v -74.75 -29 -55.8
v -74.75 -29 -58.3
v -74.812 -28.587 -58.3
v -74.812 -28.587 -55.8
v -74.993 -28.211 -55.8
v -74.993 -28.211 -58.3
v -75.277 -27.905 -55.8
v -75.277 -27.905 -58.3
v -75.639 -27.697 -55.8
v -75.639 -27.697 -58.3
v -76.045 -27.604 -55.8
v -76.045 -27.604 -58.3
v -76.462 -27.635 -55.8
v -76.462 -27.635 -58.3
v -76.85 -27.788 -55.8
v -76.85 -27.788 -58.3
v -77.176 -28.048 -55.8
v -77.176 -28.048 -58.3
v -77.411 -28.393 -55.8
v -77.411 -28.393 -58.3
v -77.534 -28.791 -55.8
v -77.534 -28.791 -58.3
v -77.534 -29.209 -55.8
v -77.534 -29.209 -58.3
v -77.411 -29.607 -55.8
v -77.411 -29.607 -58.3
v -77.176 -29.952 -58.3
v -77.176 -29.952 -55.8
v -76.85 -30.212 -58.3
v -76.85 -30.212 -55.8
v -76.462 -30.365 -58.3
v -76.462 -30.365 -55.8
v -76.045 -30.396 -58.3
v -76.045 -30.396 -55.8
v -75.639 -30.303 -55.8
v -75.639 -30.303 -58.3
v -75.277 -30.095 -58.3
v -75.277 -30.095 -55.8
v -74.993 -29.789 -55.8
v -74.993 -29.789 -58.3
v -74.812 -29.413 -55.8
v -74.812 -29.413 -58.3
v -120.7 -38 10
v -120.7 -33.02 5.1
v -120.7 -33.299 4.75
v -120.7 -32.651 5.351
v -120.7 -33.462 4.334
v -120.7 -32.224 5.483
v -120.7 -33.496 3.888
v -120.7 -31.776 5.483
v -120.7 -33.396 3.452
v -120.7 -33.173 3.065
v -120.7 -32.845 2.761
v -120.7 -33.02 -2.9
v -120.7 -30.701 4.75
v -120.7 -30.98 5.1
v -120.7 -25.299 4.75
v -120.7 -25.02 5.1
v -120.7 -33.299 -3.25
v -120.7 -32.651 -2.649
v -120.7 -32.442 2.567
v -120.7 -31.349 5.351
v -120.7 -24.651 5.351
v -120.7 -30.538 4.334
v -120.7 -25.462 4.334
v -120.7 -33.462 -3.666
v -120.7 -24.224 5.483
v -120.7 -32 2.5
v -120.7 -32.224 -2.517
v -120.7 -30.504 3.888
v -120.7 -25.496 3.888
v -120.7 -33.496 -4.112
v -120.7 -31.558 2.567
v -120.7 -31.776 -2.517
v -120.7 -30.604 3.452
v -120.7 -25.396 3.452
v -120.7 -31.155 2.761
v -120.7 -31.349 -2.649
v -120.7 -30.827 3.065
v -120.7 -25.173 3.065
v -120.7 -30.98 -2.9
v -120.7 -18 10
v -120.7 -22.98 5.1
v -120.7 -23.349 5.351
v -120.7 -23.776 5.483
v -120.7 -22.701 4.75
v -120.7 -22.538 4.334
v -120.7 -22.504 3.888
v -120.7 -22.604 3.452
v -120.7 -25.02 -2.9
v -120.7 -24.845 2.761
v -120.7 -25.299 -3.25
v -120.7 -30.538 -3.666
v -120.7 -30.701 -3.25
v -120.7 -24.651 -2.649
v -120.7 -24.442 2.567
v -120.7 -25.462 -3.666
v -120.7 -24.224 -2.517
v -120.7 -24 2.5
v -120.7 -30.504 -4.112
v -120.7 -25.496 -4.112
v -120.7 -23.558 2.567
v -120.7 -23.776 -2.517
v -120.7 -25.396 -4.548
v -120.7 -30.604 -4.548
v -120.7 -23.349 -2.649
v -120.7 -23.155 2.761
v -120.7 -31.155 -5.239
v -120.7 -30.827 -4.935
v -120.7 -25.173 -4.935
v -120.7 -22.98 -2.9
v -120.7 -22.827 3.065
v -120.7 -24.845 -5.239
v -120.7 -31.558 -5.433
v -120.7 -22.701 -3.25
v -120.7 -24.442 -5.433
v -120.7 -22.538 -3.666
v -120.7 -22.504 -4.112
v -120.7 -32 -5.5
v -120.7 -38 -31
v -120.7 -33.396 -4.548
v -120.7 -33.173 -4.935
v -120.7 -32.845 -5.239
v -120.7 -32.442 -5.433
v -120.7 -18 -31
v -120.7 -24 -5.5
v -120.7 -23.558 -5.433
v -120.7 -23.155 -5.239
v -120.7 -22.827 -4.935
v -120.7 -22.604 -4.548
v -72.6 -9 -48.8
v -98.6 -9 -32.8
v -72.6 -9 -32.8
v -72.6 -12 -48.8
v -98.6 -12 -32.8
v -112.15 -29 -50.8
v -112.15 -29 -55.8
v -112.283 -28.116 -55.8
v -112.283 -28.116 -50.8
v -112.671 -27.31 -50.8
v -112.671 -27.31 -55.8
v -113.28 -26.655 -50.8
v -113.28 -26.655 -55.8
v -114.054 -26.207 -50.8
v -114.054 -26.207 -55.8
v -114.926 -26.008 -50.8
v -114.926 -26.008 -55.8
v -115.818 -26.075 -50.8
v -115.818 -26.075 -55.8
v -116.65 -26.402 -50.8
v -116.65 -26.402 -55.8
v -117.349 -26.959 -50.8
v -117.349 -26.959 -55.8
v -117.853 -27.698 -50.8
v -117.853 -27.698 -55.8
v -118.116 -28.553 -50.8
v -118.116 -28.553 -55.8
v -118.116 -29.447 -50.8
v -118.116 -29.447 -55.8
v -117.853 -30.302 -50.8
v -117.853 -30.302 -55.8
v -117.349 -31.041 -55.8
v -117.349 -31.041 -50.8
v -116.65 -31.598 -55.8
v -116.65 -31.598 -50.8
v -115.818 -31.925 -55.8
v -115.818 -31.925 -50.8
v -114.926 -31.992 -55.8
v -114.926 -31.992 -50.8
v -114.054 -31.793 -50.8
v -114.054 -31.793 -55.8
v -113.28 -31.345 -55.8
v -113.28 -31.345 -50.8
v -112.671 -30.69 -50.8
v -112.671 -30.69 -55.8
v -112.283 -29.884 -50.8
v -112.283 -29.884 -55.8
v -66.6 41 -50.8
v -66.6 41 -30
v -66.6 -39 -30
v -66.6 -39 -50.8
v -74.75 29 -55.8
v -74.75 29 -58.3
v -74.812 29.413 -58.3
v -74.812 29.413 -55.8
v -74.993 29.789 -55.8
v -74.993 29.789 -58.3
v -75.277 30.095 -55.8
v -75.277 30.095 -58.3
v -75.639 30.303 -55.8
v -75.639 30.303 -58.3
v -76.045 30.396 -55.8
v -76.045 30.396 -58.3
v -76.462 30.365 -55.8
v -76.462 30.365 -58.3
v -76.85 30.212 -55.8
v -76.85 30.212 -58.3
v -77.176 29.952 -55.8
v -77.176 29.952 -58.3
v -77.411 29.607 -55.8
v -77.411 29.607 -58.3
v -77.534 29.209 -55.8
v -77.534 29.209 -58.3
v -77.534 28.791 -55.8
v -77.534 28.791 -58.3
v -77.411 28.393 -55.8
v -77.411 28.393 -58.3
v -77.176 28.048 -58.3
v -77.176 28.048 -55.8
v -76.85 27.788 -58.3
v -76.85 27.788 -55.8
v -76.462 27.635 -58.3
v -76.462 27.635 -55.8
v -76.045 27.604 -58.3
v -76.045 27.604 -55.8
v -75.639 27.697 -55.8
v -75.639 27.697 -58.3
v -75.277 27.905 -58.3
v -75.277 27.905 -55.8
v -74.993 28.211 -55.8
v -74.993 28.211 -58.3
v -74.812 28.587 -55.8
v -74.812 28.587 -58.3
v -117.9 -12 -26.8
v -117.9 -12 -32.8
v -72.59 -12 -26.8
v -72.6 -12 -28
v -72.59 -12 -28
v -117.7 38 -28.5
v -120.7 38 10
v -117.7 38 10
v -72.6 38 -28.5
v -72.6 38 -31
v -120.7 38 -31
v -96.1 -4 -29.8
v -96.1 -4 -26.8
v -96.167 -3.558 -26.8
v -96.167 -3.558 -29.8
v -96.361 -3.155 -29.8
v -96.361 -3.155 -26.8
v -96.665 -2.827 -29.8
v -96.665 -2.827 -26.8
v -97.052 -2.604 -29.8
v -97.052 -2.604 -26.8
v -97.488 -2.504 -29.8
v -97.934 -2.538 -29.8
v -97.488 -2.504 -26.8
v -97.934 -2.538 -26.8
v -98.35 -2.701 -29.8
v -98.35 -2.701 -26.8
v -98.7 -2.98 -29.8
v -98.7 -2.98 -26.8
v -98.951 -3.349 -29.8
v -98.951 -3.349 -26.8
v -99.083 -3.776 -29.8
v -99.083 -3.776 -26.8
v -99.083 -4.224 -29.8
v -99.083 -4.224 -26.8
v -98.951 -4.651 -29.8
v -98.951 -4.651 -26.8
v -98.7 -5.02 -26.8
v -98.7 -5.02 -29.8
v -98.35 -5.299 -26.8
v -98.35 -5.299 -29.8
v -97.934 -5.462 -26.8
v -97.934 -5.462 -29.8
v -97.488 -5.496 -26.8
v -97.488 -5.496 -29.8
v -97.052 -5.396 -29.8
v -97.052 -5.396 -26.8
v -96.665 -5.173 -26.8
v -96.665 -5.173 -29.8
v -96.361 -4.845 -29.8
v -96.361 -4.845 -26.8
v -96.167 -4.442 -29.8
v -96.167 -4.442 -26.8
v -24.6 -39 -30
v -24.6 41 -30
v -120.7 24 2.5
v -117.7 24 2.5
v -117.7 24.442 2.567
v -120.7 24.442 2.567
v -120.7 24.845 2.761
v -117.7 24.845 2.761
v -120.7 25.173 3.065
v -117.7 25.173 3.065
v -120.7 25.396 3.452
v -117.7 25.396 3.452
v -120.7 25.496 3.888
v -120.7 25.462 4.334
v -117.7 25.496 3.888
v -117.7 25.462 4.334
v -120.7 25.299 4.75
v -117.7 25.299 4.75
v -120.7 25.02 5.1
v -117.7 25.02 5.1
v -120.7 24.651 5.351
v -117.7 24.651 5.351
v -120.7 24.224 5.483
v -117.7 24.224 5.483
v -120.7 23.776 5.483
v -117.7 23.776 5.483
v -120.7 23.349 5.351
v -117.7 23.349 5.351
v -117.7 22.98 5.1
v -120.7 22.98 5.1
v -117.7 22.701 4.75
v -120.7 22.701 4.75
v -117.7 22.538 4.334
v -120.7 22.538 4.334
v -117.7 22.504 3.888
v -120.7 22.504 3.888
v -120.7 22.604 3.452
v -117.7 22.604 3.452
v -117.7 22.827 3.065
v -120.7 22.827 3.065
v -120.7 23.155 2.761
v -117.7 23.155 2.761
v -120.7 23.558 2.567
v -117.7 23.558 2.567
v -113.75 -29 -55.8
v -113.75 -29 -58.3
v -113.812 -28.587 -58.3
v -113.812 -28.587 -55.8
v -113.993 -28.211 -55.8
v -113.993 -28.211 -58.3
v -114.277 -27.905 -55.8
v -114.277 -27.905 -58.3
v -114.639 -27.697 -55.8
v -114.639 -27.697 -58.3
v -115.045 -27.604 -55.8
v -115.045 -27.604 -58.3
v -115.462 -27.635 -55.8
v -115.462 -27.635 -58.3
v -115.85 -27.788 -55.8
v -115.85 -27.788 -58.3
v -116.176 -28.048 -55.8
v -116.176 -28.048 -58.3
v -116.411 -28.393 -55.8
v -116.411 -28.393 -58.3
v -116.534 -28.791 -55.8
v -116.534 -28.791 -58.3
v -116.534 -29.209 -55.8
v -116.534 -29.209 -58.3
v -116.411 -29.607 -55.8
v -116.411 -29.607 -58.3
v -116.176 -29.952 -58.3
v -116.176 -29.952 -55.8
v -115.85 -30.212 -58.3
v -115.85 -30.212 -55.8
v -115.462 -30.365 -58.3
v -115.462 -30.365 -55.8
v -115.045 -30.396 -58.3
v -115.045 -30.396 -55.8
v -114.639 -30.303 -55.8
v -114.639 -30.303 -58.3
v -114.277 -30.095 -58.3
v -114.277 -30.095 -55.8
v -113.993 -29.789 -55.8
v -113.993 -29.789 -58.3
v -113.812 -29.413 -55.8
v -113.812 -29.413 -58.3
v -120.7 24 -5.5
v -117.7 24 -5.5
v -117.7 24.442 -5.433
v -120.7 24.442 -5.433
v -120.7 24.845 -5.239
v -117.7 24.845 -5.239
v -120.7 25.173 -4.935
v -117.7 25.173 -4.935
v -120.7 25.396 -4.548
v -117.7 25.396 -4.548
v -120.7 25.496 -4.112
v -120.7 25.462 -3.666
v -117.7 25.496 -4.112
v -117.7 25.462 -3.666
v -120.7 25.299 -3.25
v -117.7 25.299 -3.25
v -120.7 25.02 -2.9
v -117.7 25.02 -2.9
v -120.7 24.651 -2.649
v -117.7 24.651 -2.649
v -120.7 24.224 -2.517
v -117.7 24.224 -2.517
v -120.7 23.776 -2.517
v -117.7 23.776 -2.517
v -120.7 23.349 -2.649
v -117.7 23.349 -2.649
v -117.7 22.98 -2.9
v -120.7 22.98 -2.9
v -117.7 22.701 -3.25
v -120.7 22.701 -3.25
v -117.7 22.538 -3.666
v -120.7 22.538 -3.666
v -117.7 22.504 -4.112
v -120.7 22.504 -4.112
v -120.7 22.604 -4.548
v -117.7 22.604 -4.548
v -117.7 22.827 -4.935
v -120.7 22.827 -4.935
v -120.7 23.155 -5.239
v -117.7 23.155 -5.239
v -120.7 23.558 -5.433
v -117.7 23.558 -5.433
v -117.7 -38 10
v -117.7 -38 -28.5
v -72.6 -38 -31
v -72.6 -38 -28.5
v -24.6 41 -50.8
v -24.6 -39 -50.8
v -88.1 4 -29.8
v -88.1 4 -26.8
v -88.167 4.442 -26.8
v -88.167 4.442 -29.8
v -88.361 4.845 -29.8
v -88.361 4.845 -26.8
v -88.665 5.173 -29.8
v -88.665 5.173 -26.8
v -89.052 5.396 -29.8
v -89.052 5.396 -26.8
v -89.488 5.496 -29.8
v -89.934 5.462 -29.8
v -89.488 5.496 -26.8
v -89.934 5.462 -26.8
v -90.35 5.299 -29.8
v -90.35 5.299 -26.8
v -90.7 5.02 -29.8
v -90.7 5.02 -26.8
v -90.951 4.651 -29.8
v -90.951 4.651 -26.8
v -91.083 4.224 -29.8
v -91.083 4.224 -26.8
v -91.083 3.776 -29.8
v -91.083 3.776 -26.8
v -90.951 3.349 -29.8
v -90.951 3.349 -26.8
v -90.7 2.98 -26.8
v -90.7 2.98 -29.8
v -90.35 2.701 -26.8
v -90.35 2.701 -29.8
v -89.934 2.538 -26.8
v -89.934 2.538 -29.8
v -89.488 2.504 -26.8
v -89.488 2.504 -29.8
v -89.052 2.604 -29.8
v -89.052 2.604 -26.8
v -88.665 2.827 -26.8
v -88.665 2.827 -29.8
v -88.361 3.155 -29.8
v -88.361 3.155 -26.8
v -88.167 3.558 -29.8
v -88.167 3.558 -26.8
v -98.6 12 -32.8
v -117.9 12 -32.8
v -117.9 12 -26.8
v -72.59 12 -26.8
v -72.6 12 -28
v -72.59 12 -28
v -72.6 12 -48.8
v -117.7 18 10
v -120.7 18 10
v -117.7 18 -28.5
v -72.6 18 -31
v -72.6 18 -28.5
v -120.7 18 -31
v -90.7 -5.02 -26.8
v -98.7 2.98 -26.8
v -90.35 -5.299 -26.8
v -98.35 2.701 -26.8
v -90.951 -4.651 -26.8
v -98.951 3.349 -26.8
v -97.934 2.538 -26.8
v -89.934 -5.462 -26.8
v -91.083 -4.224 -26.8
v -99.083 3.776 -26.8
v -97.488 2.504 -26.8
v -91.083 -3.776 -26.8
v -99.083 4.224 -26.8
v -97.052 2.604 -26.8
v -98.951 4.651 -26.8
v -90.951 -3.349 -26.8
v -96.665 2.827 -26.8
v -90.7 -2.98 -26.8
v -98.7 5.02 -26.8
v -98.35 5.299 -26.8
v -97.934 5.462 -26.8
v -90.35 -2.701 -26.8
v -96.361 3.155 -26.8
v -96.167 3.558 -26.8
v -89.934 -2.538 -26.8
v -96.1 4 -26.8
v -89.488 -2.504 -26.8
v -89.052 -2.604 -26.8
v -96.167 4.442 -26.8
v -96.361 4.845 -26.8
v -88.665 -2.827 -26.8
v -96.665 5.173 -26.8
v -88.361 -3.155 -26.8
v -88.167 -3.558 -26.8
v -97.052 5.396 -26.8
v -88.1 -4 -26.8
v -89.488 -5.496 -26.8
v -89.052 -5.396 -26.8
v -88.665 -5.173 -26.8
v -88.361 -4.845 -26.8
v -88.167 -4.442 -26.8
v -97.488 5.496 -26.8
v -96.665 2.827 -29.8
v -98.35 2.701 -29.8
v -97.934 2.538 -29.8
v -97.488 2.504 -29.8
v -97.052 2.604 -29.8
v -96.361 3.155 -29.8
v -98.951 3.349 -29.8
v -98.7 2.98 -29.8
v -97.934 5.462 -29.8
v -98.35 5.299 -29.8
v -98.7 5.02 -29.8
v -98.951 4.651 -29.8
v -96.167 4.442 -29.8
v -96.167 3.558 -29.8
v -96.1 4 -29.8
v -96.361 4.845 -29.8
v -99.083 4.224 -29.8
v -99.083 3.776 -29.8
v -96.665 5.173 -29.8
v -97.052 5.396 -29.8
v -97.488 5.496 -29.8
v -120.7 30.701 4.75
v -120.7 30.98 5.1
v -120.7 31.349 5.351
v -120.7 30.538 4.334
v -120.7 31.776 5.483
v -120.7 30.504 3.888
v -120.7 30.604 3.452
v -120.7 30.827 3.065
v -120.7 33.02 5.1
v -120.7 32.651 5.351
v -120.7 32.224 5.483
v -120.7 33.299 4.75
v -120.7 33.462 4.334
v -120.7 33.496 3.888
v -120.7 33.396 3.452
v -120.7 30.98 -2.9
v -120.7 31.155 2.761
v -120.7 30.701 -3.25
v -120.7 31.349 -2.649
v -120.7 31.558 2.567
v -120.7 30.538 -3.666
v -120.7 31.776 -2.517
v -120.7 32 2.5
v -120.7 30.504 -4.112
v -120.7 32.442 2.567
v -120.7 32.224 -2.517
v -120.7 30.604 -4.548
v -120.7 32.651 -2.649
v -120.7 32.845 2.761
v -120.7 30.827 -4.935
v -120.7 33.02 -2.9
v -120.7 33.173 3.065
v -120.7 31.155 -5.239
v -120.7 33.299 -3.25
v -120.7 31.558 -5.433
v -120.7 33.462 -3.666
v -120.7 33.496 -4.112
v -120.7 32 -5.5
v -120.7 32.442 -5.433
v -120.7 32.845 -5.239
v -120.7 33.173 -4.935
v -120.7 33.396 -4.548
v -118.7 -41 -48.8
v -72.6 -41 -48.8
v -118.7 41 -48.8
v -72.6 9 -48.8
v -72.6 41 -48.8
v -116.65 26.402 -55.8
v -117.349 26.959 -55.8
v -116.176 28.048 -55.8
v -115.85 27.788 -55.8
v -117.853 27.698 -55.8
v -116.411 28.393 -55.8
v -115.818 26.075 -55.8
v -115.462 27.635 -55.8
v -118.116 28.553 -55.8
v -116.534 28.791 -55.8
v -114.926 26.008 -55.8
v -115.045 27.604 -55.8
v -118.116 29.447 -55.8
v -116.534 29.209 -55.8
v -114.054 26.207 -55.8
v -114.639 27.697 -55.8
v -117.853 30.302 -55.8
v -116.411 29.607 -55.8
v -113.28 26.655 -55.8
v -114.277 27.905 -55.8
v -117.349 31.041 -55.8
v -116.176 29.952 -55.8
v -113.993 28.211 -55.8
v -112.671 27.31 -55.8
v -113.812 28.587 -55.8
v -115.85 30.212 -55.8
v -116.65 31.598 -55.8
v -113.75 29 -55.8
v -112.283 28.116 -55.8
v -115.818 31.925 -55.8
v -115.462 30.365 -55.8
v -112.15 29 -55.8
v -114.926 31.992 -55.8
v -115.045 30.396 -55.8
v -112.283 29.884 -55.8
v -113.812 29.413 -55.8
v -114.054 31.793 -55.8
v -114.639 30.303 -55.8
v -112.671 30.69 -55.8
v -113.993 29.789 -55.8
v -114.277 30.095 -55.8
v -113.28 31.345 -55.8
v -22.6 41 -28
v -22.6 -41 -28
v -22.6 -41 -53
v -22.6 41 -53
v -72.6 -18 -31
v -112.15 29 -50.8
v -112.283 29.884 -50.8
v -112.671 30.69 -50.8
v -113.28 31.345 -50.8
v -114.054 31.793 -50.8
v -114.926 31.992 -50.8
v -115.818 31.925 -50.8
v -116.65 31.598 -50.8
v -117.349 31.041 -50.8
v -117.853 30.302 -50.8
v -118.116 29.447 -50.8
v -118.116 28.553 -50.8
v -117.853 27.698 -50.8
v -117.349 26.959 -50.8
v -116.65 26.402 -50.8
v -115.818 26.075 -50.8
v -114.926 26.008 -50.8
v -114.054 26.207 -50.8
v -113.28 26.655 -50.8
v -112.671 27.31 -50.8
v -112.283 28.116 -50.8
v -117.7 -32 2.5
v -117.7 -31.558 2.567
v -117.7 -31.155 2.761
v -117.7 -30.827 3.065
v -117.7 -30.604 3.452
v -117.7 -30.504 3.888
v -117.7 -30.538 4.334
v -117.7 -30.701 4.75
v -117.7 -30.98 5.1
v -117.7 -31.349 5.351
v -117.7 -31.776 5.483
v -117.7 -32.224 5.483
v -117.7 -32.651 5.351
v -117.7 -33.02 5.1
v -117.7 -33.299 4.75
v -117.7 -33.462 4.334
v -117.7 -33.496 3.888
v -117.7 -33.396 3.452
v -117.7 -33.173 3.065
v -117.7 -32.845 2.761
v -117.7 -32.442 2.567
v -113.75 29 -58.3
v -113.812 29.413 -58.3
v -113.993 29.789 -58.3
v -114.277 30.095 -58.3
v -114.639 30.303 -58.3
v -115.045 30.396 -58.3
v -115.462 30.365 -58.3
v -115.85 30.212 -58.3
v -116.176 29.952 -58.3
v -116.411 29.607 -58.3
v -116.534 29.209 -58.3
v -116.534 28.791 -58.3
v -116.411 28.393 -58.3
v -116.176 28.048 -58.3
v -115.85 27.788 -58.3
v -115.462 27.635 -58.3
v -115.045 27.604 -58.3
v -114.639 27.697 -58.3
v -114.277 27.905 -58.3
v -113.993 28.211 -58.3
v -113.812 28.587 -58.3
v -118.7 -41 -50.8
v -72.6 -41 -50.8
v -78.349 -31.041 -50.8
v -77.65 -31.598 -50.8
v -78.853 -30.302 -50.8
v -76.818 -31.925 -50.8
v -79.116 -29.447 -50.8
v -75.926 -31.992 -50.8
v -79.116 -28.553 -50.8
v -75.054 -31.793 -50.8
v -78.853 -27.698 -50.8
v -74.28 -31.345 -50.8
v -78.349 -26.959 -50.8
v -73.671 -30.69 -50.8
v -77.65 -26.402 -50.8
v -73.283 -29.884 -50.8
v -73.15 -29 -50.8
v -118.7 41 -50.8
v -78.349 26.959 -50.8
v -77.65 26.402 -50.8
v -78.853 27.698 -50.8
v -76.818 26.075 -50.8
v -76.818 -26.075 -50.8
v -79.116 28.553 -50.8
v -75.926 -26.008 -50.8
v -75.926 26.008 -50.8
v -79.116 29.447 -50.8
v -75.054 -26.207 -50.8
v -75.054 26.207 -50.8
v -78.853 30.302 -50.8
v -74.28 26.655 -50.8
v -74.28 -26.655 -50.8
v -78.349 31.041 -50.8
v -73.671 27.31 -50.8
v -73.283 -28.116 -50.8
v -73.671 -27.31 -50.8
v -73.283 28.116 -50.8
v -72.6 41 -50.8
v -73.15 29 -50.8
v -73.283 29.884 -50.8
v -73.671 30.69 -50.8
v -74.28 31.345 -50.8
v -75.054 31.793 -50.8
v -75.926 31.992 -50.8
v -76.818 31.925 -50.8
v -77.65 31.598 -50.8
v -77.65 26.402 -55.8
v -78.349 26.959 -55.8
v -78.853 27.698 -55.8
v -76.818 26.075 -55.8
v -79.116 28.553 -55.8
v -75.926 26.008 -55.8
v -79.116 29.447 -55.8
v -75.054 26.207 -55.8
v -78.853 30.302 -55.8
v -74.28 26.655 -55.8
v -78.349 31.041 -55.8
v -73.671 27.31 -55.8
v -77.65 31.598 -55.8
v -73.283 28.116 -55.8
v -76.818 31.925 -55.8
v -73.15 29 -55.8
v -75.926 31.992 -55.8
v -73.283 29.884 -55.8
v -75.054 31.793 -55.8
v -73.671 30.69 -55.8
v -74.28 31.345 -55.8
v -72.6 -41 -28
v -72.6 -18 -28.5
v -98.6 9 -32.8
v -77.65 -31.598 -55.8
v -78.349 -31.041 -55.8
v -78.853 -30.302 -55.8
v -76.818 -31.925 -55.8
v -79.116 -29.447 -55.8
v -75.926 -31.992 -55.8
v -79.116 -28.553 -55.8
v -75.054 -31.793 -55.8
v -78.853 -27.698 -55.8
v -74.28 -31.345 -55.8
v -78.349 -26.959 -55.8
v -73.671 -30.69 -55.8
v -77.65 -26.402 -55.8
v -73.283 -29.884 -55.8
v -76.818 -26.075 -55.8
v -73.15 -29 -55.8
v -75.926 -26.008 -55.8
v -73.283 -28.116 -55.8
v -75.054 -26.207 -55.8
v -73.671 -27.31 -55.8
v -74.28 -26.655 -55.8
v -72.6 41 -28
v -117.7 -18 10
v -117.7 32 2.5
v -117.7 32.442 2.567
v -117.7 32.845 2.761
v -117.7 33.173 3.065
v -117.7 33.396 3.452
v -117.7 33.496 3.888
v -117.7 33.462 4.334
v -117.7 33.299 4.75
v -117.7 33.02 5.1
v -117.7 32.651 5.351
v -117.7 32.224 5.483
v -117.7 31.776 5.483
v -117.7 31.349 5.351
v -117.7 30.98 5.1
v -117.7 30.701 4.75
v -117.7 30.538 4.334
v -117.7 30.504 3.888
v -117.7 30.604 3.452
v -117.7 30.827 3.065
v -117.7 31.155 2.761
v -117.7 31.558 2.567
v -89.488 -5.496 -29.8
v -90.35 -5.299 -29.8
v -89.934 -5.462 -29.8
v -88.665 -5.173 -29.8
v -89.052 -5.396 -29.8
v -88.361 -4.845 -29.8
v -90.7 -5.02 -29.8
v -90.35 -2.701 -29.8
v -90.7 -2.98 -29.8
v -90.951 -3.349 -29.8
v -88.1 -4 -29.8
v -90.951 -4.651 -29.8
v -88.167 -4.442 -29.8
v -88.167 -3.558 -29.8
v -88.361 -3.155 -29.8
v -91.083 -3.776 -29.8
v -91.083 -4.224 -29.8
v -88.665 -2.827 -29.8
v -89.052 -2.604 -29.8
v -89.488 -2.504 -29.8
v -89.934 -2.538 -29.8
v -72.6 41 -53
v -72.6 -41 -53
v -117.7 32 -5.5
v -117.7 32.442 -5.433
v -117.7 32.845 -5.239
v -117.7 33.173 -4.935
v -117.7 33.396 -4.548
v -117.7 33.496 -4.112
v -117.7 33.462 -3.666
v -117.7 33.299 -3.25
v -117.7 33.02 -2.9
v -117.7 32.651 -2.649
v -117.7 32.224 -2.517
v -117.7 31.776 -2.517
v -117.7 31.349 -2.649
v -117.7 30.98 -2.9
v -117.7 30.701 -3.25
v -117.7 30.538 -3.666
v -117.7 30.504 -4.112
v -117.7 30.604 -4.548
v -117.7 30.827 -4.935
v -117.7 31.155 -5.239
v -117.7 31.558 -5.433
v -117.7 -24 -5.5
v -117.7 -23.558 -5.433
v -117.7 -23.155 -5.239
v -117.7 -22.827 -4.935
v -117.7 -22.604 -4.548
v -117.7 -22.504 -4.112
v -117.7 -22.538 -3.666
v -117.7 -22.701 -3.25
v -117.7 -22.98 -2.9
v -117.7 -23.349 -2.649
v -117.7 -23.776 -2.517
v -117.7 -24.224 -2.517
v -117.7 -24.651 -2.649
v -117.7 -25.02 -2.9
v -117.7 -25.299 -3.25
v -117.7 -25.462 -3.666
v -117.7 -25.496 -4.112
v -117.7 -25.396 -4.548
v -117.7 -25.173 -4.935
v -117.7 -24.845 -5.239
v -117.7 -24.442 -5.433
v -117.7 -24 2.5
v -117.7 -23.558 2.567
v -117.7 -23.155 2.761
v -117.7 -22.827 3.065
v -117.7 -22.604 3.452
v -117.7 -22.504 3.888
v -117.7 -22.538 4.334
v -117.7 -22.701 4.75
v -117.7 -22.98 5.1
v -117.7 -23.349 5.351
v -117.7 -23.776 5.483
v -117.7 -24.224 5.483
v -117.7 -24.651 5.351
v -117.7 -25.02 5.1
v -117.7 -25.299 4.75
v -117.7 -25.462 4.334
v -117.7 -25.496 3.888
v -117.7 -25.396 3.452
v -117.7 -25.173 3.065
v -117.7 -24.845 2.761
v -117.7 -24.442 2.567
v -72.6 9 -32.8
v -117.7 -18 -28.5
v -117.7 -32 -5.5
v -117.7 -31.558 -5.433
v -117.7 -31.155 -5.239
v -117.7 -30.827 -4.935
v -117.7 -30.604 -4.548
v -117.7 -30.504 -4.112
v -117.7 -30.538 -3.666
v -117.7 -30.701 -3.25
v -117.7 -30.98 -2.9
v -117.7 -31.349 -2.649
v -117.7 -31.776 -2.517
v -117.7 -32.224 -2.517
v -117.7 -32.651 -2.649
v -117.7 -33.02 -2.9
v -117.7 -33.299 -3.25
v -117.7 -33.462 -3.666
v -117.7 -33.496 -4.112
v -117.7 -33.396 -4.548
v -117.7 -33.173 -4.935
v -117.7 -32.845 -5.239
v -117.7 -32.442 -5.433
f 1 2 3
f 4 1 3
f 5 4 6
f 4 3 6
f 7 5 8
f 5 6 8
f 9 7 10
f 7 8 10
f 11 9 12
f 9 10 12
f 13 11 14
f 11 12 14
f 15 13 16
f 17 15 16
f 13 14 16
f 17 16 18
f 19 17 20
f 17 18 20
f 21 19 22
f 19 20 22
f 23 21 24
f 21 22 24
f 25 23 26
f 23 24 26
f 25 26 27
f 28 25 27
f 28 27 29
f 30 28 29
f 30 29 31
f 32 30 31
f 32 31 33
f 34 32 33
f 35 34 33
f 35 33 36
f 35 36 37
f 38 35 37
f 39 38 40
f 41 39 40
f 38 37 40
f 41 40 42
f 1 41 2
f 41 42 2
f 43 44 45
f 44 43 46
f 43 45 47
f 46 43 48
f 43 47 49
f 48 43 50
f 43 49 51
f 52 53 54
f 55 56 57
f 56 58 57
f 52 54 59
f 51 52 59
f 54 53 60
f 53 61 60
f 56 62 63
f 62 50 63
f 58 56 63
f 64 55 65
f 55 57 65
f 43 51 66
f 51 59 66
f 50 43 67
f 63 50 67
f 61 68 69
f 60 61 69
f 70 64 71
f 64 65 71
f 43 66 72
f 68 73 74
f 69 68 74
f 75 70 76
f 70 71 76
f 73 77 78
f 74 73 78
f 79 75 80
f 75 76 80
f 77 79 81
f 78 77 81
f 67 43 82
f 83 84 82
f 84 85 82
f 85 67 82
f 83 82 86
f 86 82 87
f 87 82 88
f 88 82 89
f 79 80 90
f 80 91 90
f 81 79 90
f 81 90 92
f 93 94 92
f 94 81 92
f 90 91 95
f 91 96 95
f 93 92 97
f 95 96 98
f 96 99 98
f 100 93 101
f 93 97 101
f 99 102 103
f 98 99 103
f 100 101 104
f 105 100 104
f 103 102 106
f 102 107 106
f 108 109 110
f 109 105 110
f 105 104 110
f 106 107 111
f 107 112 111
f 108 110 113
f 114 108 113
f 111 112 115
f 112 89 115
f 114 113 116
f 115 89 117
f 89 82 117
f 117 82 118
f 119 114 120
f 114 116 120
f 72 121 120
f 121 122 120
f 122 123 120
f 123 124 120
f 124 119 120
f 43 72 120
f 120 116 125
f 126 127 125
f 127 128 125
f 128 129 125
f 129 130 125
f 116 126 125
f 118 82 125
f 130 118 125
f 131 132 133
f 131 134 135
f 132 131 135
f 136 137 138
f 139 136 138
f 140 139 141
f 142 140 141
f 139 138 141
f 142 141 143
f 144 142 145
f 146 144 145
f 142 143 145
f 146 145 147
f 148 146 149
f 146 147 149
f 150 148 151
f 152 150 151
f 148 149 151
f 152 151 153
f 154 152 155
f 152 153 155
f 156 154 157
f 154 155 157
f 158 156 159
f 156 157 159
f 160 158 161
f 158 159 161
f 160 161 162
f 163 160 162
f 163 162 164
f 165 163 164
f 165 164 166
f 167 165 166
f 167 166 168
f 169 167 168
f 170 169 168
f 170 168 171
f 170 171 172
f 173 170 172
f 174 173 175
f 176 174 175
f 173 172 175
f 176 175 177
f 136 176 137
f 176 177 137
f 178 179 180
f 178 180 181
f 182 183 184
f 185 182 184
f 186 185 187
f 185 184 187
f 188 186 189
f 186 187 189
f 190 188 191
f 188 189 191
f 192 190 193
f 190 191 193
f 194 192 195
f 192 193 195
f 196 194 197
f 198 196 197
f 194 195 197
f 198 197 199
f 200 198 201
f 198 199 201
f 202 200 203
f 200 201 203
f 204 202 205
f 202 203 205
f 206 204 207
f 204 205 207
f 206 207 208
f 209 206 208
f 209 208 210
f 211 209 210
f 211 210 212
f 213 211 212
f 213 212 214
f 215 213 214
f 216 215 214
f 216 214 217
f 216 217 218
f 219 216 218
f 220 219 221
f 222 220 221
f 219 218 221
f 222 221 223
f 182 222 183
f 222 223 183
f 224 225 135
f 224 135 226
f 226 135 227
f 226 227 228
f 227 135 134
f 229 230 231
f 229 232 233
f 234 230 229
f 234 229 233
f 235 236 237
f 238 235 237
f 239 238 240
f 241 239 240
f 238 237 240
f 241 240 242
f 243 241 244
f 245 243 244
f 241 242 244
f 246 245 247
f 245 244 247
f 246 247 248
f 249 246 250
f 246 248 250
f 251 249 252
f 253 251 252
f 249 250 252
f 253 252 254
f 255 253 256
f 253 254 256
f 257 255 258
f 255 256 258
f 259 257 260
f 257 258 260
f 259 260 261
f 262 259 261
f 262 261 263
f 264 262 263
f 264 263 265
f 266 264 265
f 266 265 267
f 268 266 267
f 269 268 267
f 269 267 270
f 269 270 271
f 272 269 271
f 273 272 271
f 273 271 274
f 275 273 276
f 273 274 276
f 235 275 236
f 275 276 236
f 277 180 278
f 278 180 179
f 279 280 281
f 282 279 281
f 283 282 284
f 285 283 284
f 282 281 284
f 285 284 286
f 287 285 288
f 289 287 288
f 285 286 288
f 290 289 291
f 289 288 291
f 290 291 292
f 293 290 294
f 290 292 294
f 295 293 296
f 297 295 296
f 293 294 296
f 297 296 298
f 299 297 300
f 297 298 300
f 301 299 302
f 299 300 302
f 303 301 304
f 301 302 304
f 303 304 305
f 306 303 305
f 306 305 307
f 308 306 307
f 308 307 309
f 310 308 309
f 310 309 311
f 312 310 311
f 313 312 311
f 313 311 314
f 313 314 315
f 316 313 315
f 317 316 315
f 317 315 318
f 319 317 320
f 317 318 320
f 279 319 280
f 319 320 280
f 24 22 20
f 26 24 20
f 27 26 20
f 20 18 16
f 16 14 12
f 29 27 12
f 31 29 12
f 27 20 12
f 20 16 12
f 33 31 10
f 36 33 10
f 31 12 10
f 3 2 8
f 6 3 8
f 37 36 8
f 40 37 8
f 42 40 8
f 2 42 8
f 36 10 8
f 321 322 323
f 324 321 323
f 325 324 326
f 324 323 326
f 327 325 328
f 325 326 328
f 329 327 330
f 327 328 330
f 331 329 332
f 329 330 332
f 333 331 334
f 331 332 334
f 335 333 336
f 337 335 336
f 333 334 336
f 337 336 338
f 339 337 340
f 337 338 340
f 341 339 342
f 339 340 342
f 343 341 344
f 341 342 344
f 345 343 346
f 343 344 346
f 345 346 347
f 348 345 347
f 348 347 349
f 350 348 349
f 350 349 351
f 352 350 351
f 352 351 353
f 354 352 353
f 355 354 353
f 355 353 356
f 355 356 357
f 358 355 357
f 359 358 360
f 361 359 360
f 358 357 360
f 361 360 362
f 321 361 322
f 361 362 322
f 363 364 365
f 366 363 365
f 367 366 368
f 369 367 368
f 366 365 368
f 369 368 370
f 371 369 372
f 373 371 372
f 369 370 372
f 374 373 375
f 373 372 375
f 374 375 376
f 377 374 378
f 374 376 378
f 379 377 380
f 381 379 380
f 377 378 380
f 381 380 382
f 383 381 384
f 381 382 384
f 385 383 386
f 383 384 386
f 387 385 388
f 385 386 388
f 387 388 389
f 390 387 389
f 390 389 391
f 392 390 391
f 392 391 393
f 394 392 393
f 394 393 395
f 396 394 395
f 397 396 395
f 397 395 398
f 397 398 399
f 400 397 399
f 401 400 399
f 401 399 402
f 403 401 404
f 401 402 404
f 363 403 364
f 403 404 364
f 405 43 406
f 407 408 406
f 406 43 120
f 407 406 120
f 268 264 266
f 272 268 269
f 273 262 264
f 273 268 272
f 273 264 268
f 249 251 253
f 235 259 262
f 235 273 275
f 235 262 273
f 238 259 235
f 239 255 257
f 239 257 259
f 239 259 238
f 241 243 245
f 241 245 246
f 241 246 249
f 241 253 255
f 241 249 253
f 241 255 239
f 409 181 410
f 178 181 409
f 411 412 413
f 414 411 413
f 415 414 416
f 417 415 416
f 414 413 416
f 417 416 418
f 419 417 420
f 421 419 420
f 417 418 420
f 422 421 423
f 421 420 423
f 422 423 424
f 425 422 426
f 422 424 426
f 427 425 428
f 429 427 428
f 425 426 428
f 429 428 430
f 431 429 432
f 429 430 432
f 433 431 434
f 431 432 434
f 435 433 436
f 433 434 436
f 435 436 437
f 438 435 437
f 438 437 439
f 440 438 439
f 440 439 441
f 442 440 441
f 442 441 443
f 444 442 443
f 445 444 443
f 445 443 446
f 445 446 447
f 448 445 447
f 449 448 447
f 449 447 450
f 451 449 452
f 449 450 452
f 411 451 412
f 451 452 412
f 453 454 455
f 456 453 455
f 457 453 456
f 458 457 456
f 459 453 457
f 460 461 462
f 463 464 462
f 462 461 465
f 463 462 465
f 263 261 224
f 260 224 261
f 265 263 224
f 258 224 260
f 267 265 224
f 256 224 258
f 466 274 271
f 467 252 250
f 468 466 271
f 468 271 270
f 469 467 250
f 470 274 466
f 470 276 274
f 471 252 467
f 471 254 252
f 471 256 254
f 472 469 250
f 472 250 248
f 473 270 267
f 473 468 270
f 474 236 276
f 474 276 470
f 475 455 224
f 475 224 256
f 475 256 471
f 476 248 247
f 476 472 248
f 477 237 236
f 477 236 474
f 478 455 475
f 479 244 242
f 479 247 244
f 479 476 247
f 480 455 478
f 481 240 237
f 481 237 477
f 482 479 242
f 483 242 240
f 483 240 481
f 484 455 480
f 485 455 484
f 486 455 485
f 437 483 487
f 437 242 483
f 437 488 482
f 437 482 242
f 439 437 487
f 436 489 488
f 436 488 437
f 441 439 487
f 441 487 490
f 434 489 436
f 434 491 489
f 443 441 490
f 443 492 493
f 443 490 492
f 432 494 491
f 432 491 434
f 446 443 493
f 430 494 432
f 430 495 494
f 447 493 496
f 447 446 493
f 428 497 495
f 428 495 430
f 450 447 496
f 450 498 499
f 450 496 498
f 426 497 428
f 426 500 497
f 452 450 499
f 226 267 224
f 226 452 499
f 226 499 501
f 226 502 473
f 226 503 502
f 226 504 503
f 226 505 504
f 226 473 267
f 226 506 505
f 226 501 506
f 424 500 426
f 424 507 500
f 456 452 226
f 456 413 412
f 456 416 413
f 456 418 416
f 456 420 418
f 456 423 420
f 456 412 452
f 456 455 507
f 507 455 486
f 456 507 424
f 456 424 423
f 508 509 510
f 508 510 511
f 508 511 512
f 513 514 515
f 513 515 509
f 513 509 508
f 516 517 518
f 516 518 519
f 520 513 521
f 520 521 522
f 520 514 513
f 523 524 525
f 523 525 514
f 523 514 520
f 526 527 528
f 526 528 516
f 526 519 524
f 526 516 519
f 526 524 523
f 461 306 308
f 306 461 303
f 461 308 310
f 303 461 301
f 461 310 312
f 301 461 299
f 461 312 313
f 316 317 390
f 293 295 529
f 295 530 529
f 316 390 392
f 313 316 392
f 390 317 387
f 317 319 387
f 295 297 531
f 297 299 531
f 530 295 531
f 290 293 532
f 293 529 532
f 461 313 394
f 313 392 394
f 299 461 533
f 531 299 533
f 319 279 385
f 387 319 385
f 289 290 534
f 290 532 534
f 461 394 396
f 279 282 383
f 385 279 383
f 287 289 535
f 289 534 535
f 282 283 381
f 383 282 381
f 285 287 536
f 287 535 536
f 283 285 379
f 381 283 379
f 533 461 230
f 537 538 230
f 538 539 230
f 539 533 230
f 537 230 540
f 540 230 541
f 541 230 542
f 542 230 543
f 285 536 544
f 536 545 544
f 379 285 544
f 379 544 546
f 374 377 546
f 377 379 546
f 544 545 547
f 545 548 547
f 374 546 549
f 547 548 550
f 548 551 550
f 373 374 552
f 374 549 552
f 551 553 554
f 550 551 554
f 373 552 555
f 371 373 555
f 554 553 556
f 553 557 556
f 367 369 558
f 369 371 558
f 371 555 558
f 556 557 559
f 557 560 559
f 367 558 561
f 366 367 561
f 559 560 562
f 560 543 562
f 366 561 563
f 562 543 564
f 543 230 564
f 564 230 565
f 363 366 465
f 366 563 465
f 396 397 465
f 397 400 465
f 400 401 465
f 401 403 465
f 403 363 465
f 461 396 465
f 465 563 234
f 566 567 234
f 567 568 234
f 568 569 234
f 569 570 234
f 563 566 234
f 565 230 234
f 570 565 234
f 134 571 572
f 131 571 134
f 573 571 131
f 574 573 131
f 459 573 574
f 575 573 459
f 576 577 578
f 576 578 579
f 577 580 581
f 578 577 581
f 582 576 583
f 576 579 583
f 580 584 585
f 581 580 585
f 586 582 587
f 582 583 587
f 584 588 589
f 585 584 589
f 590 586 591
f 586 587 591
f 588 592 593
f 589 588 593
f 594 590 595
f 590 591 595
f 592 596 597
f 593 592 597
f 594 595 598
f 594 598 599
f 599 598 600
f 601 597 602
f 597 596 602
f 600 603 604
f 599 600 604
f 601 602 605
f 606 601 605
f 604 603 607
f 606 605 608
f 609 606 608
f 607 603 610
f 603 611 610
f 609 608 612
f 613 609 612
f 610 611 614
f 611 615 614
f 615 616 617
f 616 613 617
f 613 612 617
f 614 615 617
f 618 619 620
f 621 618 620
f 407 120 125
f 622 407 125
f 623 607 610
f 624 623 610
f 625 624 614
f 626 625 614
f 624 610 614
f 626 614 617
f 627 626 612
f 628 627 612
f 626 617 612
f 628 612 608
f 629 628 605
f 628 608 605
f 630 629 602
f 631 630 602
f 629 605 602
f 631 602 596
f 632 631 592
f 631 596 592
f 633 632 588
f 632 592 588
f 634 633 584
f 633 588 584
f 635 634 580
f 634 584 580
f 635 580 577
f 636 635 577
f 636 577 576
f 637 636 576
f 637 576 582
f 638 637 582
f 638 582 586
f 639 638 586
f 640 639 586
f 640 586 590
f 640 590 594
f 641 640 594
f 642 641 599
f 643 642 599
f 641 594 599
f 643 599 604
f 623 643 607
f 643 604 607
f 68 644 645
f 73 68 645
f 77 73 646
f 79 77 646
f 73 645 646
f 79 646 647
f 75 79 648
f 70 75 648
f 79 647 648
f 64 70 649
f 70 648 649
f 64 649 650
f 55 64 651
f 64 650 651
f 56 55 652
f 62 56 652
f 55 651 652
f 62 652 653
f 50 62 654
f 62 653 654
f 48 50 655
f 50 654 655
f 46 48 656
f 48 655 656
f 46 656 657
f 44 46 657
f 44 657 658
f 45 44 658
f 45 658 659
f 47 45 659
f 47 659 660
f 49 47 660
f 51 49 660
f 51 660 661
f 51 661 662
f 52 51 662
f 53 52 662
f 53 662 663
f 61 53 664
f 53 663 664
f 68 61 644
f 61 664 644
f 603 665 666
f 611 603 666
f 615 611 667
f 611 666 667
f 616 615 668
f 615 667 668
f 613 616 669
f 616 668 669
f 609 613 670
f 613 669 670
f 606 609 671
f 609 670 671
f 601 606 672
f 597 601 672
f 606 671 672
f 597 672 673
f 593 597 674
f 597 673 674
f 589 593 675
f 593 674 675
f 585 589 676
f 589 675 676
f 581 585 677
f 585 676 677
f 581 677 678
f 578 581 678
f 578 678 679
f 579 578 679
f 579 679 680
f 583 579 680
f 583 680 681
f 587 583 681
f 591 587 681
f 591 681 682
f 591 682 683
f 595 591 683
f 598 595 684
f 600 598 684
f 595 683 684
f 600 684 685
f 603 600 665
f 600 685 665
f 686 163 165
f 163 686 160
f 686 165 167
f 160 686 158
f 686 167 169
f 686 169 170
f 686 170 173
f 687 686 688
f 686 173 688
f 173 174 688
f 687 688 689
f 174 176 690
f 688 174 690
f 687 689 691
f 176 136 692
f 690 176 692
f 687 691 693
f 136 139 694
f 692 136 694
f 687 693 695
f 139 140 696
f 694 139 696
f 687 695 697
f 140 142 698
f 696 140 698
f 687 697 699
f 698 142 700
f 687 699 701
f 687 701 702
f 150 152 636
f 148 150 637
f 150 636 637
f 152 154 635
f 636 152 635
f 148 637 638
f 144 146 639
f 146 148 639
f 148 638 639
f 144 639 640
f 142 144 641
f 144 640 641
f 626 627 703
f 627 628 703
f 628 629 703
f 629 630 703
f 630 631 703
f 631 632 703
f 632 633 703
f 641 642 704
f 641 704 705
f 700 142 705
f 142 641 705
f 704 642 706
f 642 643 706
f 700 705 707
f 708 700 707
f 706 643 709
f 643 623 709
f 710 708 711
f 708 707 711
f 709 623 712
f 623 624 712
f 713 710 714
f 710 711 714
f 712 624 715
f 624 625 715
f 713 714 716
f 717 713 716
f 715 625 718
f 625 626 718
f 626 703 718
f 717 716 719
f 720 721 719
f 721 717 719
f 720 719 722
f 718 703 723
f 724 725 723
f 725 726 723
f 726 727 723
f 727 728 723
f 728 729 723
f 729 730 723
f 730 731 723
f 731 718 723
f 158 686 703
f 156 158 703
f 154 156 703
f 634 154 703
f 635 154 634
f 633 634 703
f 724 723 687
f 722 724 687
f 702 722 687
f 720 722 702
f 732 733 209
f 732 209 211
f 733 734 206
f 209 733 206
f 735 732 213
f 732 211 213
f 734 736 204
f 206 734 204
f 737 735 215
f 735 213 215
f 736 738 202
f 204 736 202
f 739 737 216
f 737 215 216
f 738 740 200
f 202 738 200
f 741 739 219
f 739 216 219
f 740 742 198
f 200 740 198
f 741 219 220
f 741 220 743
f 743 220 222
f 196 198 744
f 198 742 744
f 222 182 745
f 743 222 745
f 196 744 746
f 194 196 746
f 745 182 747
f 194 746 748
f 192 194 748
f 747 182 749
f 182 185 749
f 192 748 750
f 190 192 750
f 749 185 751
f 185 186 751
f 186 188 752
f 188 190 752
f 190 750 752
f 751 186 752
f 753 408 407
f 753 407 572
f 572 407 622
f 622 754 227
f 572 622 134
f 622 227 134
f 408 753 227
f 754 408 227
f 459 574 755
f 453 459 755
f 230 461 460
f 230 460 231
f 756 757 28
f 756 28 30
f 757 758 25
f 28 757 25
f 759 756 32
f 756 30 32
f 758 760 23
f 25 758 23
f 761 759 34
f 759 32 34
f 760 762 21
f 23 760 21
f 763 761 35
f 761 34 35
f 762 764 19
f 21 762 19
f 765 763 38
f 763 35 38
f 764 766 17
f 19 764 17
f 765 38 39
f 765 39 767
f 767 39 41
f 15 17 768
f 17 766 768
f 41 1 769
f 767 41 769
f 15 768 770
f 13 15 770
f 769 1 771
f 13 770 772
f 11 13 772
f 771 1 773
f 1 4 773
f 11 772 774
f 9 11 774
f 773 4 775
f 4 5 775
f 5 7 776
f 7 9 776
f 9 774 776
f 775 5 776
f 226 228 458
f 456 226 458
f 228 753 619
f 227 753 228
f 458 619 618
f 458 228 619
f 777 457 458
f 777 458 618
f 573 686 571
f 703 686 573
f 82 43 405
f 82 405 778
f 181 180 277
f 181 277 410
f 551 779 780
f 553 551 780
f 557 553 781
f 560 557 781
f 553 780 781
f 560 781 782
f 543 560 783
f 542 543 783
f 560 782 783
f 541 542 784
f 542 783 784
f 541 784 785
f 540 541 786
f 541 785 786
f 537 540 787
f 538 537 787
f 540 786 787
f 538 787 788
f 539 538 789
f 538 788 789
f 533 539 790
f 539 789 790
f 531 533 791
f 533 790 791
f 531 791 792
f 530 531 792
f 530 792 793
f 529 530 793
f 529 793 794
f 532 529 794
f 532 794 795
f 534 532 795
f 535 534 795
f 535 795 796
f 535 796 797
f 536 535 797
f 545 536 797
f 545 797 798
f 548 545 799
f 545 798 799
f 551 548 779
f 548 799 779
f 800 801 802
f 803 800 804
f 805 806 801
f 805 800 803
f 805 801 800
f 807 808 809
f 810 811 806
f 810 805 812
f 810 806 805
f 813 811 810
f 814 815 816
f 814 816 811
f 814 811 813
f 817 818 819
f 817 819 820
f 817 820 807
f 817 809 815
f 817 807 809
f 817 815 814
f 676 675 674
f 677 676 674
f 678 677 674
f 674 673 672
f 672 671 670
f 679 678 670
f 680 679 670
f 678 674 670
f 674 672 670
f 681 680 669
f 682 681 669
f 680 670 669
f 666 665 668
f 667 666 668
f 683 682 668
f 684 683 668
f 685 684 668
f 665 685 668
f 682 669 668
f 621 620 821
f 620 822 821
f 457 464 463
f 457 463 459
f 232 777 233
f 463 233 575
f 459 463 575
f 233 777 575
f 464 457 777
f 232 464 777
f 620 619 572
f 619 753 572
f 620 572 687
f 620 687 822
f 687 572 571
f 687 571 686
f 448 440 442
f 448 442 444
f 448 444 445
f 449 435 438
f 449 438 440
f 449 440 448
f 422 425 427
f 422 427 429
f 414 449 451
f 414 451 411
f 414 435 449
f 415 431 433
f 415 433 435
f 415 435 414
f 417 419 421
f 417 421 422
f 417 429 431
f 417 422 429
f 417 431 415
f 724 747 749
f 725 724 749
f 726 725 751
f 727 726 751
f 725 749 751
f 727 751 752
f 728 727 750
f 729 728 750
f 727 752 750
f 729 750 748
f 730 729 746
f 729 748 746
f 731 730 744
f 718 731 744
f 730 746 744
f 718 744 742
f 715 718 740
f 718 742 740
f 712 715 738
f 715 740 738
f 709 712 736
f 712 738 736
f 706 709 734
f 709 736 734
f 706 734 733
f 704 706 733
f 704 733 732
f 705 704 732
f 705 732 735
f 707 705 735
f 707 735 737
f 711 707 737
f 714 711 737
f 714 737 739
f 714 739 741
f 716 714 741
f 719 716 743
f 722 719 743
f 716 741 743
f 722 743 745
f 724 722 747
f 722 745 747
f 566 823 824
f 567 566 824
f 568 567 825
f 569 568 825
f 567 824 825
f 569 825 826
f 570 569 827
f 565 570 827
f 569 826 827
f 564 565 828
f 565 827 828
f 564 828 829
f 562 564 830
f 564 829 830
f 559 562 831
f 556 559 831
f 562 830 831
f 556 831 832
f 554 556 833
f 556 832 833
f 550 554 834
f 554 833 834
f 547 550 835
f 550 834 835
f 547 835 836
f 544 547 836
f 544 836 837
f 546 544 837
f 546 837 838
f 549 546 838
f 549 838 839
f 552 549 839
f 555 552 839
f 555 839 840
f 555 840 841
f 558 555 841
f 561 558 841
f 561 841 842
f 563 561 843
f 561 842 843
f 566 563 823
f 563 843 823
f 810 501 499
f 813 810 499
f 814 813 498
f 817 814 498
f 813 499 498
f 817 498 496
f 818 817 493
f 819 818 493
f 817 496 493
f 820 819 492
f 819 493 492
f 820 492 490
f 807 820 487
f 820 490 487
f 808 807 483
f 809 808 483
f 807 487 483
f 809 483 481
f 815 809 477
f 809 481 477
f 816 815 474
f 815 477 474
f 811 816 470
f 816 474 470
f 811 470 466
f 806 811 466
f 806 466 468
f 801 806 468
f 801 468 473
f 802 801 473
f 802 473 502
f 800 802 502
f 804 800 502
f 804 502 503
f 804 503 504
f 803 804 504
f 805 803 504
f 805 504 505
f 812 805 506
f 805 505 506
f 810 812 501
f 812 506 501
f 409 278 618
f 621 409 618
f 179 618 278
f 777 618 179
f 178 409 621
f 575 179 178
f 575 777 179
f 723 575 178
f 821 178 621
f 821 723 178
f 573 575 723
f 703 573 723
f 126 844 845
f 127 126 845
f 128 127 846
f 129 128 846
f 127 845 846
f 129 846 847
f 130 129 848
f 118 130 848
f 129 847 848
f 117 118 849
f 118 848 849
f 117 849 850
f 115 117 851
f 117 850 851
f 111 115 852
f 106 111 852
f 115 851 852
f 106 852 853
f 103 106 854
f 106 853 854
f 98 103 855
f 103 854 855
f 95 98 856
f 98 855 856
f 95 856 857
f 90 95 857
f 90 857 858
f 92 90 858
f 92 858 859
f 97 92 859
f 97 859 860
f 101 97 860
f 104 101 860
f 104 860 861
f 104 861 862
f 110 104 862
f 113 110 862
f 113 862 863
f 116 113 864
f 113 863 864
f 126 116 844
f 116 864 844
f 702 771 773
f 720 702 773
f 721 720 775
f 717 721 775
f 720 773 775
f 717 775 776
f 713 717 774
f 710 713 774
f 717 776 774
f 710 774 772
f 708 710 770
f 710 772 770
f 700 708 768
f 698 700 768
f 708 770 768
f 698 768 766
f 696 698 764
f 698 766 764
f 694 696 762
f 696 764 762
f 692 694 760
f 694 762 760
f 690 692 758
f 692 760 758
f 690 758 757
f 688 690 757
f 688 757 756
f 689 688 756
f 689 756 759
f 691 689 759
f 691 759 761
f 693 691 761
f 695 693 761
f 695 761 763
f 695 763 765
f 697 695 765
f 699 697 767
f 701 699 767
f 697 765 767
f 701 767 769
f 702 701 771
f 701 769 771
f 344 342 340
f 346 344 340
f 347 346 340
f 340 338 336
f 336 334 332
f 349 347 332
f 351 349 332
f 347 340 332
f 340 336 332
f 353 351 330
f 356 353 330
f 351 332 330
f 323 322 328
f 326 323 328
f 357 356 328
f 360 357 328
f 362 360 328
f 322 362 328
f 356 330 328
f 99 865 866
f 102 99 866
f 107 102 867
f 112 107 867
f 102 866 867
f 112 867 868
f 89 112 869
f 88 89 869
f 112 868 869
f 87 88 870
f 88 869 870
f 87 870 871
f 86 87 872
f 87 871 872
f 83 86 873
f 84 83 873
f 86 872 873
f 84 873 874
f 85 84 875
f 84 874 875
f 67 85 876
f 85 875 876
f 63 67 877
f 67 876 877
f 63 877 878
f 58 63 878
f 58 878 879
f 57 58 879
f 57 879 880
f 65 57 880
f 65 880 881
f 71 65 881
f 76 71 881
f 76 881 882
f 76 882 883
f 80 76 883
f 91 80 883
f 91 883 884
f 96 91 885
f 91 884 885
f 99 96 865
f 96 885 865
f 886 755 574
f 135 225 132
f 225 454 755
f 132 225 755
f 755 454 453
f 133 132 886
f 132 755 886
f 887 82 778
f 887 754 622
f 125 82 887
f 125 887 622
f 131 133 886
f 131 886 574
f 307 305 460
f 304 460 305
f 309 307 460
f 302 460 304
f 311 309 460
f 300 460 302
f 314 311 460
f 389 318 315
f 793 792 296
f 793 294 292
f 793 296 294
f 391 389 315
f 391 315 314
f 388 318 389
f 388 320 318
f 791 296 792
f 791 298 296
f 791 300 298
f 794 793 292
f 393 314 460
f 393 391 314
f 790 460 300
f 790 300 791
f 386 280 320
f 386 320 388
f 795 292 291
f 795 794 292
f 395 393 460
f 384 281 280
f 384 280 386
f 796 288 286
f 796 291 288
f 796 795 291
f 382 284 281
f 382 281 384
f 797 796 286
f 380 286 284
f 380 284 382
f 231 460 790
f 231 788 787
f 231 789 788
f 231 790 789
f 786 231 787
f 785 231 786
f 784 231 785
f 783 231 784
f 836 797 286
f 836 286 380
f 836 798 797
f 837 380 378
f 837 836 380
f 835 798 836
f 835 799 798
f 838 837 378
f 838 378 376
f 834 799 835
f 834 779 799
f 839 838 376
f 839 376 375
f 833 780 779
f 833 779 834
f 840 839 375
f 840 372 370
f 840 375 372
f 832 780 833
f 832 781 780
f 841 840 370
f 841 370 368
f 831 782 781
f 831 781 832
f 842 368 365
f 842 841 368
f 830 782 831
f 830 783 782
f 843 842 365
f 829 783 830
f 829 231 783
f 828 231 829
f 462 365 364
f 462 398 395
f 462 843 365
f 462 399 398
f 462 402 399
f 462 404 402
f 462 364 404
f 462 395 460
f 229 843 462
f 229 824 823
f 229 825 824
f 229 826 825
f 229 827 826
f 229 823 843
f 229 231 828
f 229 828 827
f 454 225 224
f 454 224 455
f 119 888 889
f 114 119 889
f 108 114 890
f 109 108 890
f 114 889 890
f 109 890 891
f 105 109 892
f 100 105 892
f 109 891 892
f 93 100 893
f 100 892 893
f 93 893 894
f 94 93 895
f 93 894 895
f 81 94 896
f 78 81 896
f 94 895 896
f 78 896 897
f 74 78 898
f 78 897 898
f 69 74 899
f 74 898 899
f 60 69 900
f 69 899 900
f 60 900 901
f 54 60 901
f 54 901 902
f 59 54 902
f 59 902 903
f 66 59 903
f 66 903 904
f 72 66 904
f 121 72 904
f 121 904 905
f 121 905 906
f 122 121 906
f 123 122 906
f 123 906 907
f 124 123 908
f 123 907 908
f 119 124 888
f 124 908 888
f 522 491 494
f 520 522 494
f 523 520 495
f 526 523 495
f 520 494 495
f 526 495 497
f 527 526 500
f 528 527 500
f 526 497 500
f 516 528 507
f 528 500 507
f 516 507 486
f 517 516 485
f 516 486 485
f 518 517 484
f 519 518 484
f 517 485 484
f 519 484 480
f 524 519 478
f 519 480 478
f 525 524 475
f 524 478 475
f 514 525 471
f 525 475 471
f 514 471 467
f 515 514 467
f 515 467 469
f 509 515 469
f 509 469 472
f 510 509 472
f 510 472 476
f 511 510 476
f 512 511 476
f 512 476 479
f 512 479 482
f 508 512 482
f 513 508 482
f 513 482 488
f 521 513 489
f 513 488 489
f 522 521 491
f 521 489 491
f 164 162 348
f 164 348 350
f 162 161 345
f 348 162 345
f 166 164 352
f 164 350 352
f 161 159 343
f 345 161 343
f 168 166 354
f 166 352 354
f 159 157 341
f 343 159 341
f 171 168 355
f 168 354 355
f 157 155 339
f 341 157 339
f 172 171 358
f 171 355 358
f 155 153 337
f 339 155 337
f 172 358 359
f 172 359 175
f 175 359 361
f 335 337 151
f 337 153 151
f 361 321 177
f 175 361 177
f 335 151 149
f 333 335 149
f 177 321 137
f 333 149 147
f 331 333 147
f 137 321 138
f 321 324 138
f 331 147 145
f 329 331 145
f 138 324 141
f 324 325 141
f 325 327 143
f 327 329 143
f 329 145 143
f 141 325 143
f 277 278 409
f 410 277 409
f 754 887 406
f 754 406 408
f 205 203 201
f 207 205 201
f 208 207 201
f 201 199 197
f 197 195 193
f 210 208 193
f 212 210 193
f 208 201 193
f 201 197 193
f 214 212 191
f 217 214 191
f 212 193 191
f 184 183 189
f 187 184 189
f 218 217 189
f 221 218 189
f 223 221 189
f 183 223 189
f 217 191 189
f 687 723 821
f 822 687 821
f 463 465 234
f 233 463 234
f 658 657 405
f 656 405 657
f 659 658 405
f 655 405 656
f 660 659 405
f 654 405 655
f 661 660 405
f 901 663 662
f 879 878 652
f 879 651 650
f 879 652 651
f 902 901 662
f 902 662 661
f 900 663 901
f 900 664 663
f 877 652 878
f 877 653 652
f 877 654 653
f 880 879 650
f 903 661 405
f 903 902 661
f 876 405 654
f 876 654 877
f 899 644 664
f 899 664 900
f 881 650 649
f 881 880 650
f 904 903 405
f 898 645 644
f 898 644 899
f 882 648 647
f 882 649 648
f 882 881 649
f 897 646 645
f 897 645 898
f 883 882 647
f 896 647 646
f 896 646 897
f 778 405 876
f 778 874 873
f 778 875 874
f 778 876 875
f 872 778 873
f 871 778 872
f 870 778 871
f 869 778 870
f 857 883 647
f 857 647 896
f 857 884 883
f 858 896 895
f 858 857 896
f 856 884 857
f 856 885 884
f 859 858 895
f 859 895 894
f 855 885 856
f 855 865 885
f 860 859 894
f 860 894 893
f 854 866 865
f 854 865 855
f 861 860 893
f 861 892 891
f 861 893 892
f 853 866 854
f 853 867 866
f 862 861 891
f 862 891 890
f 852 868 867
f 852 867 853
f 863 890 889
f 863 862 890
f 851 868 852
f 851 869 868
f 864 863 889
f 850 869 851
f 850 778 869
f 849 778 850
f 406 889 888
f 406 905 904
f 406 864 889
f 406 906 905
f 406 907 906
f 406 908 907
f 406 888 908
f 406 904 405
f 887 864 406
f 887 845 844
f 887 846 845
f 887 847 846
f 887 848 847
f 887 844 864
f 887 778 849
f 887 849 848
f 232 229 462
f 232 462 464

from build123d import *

# Parameters (mm, degrees)
SKETCH1_W            = 25
SKETCH1_H            = 82
BOSS_EXTRUDE1_DEPTH  = 6
SKETCH2_W            = 45.31
SKETCH2_H            = 24
BOSS_EXTRUDE2_DEPTH  = 6
BOSS_EXTRUDE3_DEPTH  = 3
BOSS_EXTRUDE4_DEPTH  = 3
SKETCH5_W            = 41
SKETCH5_H            = 20
BOSS_EXTRUDE5_DEPTH  = 3
SKETCH6_W            = 48.1
SKETCH6_H            = 20
BOSS_EXTRUDE6_DEPTH  = 2.5
SKETCH7_W            = 41
SKETCH7_H            = 20
BOSS_EXTRUDE7_DEPTH  = 3
SKETCH8_W            = 48.1
SKETCH8_H            = 20
BOSS_EXTRUDE8_DEPTH  = 2.5
SKETCH9_R            = 1.5
CUT_EXTRUDE1_DEPTH   = 3
SKETCH10_R           = 1.5
CUT_EXTRUDE2_DEPTH   = 3
SKETCH11_W           = 46.1
SKETCH11_H           = 82
BOSS_EXTRUDE9_DEPTH  = 2
SKETCH12_R           = 3
BOSS_EXTRUDE10_DEPTH = 5
SKETCH13_R           = 1.4
BOSS_EXTRUDE11_DEPTH = 2.5
SKETCH14_W           = 2
SKETCH14_H           = 82
BOSS_EXTRUDE12_DEPTH = 42
SKETCH15_W           = 2.2
SKETCH15_H           = 82
BOSS_EXTRUDE13_DEPTH = 42
SKETCH16_W           = 20.8
SKETCH16_H           = 2
BOSS_EXTRUDE14_DEPTH = 42
SKETCH17_W           = 25
SKETCH17_H           = 82
BOSS_EXTRUDE15_DEPTH = 2


with BuildPart() as part:
    # Sketch1 → Boss-Extrude1 (new body)
    with BuildSketch(Plane(origin=(-72.6, 0, 0), x_dir=(0, 0, -1), z_dir=(1, 0, 0))):
        with Locations((40.5, 0)):
            Rectangle(SKETCH1_W, SKETCH1_H)
    extrude(amount=BOSS_EXTRUDE1_DEPTH)

    # Sketch2 → Boss-Extrude2 (add)
    with BuildSketch(Plane.XY.offset(-32.8)):
        with Locations((-95.245, 0)):
            Rectangle(SKETCH2_W, SKETCH2_H)
    extrude(amount=BOSS_EXTRUDE2_DEPTH)

    # Sketch3 → Boss-Extrude3 (add)
    with BuildSketch(Plane(origin=(0, 9, 0), x_dir=(1, 0, 0), z_dir=(0, 1, 0))):
        Polygon((-72.6, 32.8), (-72.6, 48.8), (-98.6, 32.8), align=None)
    extrude(amount=BOSS_EXTRUDE3_DEPTH)

    # Sketch4 → Boss-Extrude4 (add)
    with BuildSketch(Plane(origin=(0, -12, 0), x_dir=(1, 0, 0), z_dir=(0, 1, 0))):
        Polygon((-72.6, 32.8), (-72.6, 48.8), (-98.6, 32.8), align=None)
    extrude(amount=BOSS_EXTRUDE4_DEPTH)



with BuildPart() as body_2:
    # Sketch5 → Boss-Extrude5 (new body)
    with BuildSketch(Plane(origin=(-120.7, 0, 0), x_dir=(0, 0, -1), z_dir=(1, 0, 0))):
        with Locations((10.5, 28)):
            Rectangle(SKETCH5_W, SKETCH5_H)
    extrude(amount=BOSS_EXTRUDE5_DEPTH)


with BuildPart() as part_1:
    add(part.part)

    add(body_2.part)  # Boss-Extrude6 merges body 2
    # Sketch6 → Boss-Extrude6 (add)
    with BuildSketch(Plane.XY.offset(-31)):
        with Locations((-96.65, 28)):
            Rectangle(SKETCH6_W, SKETCH6_H)
    extrude(amount=BOSS_EXTRUDE6_DEPTH)



with BuildPart() as body_2_2:
    # Sketch7 → Boss-Extrude7 (new body)
    with BuildSketch(Plane(origin=(-120.7, 0, 0), x_dir=(0, 0, -1), z_dir=(1, 0, 0))):
        with Locations((10.5, -28)):
            Rectangle(SKETCH7_W, SKETCH7_H)
    extrude(amount=BOSS_EXTRUDE7_DEPTH)


with BuildPart() as part_2:
    add(part_1.part)

    add(body_2_2.part)  # Boss-Extrude8 merges body 2 2
    # Sketch8 → Boss-Extrude8 (add)
    with BuildSketch(Plane.XY.offset(-31)):
        with Locations((-96.65, -28)):
            Rectangle(SKETCH8_W, SKETCH8_H)
    extrude(amount=BOSS_EXTRUDE8_DEPTH)

    # Sketch9 → Cut-Extrude1 (cut)
    with BuildSketch(Plane(origin=(-117.7, 0, 0), x_dir=(0, 0, -1), z_dir=(1, 0, 0))):
        with Locations((-4, 24)):
            Circle(SKETCH9_R)
        with Locations((4, 24)):
            Circle(SKETCH9_R)
        with Locations((-4, 32)):
            Circle(SKETCH9_R)
        with Locations((4, 32)):
            Circle(SKETCH9_R)
        with Locations((-4, -32)):
            Circle(SKETCH9_R)
        with Locations((4, -32)):
            Circle(SKETCH9_R)
        with Locations((-4, -24)):
            Circle(SKETCH9_R)
        with Locations((4, -24)):
            Circle(SKETCH9_R)
    extrude(amount=-CUT_EXTRUDE1_DEPTH, mode=Mode.SUBTRACT)

    # Sketch10 → Cut-Extrude2 (cut)
    with BuildSketch(Plane.XY.offset(-26.8)):
        with Locations((-89.6, 4)):
            Circle(SKETCH10_R)
        with Locations((-89.6, -4)):
            Circle(SKETCH10_R)
        with Locations((-97.6, 4)):
            Circle(SKETCH10_R)
        with Locations((-97.6, -4)):
            Circle(SKETCH10_R)
    extrude(amount=-CUT_EXTRUDE2_DEPTH, mode=Mode.SUBTRACT)

    # Sketch11 → Boss-Extrude9 (add)
    with BuildSketch(Plane.XY.offset(-50.8)):
        with Locations((-95.65, 0)):
            Rectangle(SKETCH11_W, SKETCH11_H)
    extrude(amount=BOSS_EXTRUDE9_DEPTH)

    # Sketch12 → Boss-Extrude10 (add)
    with BuildSketch(Plane.XY.offset(-55.8)):
        with Locations((-115.15, -29)):
            Circle(SKETCH12_R)
        with Locations((-115.15, 29)):
            Circle(SKETCH12_R)
        with Locations((-76.15, -29)):
            Circle(SKETCH12_R)
        with Locations((-76.15, 29)):
            Circle(SKETCH12_R)
    extrude(amount=BOSS_EXTRUDE10_DEPTH)

    # Sketch13 → Boss-Extrude11 (add)
    with BuildSketch(Plane.XY.offset(-58.3)):
        with Locations((-115.15, -29)):
            Circle(SKETCH13_R)
        with Locations((-115.15, 29)):
            Circle(SKETCH13_R)
        with Locations((-76.15, -29)):
            Circle(SKETCH13_R)
        with Locations((-76.15, 29)):
            Circle(SKETCH13_R)
    extrude(amount=BOSS_EXTRUDE11_DEPTH)

    # Sketch14 → Boss-Extrude12 (add)
    with BuildSketch(Plane(origin=(-66.6, 0, 0), x_dir=(0, 0, -1), z_dir=(1, 0, 0))):
        with Locations((29, 0)):
            Rectangle(SKETCH14_W, SKETCH14_H)
    extrude(amount=BOSS_EXTRUDE12_DEPTH)

    # Sketch15 → Boss-Extrude13 (add)
    with BuildSketch(Plane(origin=(-66.6, 0, 0), x_dir=(0, 0, -1), z_dir=(1, 0, 0))):
        with Locations((51.9, 0)):
            Rectangle(SKETCH15_W, SKETCH15_H)
    extrude(amount=BOSS_EXTRUDE13_DEPTH)

    # Sketch16 → Boss-Extrude14 (add)
    with BuildSketch(Plane(origin=(-66.6, 0, 0), x_dir=(0, 0, -1), z_dir=(1, 0, 0))):
        with Locations((40.4, -40)):
            Rectangle(SKETCH16_W, SKETCH16_H)
    extrude(amount=BOSS_EXTRUDE14_DEPTH)

    # Sketch17 → Boss-Extrude15 (add)
    with BuildSketch(Plane(origin=(-24.6, 0, 0), x_dir=(0, 0, -1), z_dir=(1, 0, 0))):
        with Locations((40.5, 0)):
            Rectangle(SKETCH17_W, SKETCH17_H)
    extrude(amount=BOSS_EXTRUDE15_DEPTH)


solid = part_2.part
